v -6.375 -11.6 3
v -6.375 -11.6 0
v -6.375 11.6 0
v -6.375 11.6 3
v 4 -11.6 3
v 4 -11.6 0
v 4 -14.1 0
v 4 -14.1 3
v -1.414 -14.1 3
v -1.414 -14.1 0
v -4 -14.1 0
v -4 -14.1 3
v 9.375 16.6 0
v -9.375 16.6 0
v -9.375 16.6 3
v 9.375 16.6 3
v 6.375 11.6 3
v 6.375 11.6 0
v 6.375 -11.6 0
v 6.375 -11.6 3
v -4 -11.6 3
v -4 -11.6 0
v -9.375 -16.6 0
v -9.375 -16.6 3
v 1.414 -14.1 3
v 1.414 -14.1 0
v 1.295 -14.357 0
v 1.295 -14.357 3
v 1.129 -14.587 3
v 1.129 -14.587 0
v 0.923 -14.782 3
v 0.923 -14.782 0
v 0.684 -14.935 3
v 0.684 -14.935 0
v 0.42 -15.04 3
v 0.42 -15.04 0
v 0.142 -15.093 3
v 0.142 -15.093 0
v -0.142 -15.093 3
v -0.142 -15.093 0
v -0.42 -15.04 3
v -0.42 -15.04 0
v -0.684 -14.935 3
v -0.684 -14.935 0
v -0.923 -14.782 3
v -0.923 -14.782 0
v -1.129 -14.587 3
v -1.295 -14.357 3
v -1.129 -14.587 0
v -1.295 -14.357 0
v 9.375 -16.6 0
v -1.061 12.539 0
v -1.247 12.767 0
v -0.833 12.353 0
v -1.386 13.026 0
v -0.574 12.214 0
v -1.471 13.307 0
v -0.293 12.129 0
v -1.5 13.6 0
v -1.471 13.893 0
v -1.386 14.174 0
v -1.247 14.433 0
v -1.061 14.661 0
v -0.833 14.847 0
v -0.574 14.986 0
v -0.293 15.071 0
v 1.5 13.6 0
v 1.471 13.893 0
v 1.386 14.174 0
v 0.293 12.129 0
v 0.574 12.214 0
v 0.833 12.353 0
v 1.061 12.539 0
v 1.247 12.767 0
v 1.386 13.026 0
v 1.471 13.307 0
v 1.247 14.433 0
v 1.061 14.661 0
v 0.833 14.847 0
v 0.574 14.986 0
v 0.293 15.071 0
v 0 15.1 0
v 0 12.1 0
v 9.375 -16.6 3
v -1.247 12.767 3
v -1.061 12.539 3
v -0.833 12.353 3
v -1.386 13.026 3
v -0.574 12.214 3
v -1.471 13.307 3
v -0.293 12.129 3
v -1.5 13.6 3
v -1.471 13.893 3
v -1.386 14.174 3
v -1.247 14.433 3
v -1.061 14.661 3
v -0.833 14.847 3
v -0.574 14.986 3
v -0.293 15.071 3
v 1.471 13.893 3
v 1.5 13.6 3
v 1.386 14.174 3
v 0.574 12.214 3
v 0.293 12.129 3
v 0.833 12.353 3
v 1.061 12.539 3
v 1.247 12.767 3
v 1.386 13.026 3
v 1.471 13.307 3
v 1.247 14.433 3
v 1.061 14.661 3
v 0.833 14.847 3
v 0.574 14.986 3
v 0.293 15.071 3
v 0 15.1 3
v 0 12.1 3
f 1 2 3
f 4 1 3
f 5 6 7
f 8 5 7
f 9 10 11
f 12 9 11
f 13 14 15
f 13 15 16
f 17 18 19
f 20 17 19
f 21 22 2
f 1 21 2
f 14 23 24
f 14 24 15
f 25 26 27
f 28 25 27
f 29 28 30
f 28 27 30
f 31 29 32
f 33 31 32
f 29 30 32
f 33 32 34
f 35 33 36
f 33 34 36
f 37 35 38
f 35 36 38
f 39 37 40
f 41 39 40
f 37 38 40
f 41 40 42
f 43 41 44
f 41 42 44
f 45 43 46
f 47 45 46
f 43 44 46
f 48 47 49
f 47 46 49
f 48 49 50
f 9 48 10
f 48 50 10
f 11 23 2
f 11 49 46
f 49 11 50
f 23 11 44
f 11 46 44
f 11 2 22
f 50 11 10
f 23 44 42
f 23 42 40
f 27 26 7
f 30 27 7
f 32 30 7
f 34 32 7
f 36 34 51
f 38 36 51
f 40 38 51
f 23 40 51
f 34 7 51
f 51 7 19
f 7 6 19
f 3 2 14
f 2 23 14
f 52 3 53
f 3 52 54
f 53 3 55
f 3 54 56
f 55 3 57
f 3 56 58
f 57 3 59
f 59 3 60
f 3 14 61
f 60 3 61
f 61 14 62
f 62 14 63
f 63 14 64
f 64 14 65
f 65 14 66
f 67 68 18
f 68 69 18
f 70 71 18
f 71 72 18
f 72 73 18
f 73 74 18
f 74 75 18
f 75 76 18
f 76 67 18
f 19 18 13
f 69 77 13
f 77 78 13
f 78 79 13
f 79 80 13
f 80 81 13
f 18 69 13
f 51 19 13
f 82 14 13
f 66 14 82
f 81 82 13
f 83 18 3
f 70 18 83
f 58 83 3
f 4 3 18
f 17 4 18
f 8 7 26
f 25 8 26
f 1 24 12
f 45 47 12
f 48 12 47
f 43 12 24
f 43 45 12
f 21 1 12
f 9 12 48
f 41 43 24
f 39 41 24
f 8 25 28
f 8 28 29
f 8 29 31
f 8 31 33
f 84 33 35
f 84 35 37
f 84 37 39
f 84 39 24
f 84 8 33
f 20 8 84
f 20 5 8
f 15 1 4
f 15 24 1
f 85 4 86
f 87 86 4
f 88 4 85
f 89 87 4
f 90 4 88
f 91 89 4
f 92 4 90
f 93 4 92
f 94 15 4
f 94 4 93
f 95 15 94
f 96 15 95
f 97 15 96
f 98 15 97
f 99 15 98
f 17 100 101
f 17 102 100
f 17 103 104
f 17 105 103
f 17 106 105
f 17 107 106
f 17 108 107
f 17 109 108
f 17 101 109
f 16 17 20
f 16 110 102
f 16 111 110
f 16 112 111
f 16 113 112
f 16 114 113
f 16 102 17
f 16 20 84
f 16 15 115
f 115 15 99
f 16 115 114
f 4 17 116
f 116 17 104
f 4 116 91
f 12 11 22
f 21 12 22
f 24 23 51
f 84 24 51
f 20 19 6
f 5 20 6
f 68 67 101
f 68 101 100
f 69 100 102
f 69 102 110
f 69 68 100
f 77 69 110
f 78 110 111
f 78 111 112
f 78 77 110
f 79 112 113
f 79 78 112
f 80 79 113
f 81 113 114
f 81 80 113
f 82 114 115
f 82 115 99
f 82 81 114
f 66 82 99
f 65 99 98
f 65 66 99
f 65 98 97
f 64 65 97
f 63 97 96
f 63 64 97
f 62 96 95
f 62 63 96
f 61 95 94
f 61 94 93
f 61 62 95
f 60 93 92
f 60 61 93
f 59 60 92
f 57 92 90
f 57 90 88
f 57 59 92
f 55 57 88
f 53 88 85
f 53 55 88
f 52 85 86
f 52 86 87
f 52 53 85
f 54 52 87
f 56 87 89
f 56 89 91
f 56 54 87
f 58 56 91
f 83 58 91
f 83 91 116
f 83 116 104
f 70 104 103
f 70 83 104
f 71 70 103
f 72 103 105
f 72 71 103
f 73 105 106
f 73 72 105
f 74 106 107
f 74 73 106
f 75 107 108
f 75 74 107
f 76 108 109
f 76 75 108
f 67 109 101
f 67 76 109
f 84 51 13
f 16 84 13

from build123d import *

# Parameters (mm, degrees)
F0_W     = 18.75
F0_H     = 33.2
F0_R     = 1.5
F1_DEPTH = 3


with BuildPart() as f1:
    # F0 (on Top) → F1 (new body)
    with BuildSketch(Plane.XY):
        Rectangle(F0_W, F0_H)
        with BuildLine():
            Line((-6.375, -11.6), (-6.375, 11.6))
            Line((-6.375, 11.6), (6.375, 11.6))
            Line((6.375, 11.6), (6.375, -11.6))
            Line((6.375, -11.6), (4, -11.6))
            Line((4, -11.6), (4, -14.1))
            Line((4, -14.1), (1.414214, -14.1))
            ThreePointArc((1.414214, -14.1), (0, -15.1), (-1.414214, -14.1))
            Line((-1.414214, -14.1), (-4, -14.1))
            Line((-4, -14.1), (-4, -11.6))
            Line((-4, -11.6), (-6.375, -11.6))
        make_face(mode=Mode.SUBTRACT)
        with Locations((0, 13.6)):
            Circle(F0_R, mode=Mode.SUBTRACT)
    extrude(amount=F1_DEPTH)


solid = f1.part
